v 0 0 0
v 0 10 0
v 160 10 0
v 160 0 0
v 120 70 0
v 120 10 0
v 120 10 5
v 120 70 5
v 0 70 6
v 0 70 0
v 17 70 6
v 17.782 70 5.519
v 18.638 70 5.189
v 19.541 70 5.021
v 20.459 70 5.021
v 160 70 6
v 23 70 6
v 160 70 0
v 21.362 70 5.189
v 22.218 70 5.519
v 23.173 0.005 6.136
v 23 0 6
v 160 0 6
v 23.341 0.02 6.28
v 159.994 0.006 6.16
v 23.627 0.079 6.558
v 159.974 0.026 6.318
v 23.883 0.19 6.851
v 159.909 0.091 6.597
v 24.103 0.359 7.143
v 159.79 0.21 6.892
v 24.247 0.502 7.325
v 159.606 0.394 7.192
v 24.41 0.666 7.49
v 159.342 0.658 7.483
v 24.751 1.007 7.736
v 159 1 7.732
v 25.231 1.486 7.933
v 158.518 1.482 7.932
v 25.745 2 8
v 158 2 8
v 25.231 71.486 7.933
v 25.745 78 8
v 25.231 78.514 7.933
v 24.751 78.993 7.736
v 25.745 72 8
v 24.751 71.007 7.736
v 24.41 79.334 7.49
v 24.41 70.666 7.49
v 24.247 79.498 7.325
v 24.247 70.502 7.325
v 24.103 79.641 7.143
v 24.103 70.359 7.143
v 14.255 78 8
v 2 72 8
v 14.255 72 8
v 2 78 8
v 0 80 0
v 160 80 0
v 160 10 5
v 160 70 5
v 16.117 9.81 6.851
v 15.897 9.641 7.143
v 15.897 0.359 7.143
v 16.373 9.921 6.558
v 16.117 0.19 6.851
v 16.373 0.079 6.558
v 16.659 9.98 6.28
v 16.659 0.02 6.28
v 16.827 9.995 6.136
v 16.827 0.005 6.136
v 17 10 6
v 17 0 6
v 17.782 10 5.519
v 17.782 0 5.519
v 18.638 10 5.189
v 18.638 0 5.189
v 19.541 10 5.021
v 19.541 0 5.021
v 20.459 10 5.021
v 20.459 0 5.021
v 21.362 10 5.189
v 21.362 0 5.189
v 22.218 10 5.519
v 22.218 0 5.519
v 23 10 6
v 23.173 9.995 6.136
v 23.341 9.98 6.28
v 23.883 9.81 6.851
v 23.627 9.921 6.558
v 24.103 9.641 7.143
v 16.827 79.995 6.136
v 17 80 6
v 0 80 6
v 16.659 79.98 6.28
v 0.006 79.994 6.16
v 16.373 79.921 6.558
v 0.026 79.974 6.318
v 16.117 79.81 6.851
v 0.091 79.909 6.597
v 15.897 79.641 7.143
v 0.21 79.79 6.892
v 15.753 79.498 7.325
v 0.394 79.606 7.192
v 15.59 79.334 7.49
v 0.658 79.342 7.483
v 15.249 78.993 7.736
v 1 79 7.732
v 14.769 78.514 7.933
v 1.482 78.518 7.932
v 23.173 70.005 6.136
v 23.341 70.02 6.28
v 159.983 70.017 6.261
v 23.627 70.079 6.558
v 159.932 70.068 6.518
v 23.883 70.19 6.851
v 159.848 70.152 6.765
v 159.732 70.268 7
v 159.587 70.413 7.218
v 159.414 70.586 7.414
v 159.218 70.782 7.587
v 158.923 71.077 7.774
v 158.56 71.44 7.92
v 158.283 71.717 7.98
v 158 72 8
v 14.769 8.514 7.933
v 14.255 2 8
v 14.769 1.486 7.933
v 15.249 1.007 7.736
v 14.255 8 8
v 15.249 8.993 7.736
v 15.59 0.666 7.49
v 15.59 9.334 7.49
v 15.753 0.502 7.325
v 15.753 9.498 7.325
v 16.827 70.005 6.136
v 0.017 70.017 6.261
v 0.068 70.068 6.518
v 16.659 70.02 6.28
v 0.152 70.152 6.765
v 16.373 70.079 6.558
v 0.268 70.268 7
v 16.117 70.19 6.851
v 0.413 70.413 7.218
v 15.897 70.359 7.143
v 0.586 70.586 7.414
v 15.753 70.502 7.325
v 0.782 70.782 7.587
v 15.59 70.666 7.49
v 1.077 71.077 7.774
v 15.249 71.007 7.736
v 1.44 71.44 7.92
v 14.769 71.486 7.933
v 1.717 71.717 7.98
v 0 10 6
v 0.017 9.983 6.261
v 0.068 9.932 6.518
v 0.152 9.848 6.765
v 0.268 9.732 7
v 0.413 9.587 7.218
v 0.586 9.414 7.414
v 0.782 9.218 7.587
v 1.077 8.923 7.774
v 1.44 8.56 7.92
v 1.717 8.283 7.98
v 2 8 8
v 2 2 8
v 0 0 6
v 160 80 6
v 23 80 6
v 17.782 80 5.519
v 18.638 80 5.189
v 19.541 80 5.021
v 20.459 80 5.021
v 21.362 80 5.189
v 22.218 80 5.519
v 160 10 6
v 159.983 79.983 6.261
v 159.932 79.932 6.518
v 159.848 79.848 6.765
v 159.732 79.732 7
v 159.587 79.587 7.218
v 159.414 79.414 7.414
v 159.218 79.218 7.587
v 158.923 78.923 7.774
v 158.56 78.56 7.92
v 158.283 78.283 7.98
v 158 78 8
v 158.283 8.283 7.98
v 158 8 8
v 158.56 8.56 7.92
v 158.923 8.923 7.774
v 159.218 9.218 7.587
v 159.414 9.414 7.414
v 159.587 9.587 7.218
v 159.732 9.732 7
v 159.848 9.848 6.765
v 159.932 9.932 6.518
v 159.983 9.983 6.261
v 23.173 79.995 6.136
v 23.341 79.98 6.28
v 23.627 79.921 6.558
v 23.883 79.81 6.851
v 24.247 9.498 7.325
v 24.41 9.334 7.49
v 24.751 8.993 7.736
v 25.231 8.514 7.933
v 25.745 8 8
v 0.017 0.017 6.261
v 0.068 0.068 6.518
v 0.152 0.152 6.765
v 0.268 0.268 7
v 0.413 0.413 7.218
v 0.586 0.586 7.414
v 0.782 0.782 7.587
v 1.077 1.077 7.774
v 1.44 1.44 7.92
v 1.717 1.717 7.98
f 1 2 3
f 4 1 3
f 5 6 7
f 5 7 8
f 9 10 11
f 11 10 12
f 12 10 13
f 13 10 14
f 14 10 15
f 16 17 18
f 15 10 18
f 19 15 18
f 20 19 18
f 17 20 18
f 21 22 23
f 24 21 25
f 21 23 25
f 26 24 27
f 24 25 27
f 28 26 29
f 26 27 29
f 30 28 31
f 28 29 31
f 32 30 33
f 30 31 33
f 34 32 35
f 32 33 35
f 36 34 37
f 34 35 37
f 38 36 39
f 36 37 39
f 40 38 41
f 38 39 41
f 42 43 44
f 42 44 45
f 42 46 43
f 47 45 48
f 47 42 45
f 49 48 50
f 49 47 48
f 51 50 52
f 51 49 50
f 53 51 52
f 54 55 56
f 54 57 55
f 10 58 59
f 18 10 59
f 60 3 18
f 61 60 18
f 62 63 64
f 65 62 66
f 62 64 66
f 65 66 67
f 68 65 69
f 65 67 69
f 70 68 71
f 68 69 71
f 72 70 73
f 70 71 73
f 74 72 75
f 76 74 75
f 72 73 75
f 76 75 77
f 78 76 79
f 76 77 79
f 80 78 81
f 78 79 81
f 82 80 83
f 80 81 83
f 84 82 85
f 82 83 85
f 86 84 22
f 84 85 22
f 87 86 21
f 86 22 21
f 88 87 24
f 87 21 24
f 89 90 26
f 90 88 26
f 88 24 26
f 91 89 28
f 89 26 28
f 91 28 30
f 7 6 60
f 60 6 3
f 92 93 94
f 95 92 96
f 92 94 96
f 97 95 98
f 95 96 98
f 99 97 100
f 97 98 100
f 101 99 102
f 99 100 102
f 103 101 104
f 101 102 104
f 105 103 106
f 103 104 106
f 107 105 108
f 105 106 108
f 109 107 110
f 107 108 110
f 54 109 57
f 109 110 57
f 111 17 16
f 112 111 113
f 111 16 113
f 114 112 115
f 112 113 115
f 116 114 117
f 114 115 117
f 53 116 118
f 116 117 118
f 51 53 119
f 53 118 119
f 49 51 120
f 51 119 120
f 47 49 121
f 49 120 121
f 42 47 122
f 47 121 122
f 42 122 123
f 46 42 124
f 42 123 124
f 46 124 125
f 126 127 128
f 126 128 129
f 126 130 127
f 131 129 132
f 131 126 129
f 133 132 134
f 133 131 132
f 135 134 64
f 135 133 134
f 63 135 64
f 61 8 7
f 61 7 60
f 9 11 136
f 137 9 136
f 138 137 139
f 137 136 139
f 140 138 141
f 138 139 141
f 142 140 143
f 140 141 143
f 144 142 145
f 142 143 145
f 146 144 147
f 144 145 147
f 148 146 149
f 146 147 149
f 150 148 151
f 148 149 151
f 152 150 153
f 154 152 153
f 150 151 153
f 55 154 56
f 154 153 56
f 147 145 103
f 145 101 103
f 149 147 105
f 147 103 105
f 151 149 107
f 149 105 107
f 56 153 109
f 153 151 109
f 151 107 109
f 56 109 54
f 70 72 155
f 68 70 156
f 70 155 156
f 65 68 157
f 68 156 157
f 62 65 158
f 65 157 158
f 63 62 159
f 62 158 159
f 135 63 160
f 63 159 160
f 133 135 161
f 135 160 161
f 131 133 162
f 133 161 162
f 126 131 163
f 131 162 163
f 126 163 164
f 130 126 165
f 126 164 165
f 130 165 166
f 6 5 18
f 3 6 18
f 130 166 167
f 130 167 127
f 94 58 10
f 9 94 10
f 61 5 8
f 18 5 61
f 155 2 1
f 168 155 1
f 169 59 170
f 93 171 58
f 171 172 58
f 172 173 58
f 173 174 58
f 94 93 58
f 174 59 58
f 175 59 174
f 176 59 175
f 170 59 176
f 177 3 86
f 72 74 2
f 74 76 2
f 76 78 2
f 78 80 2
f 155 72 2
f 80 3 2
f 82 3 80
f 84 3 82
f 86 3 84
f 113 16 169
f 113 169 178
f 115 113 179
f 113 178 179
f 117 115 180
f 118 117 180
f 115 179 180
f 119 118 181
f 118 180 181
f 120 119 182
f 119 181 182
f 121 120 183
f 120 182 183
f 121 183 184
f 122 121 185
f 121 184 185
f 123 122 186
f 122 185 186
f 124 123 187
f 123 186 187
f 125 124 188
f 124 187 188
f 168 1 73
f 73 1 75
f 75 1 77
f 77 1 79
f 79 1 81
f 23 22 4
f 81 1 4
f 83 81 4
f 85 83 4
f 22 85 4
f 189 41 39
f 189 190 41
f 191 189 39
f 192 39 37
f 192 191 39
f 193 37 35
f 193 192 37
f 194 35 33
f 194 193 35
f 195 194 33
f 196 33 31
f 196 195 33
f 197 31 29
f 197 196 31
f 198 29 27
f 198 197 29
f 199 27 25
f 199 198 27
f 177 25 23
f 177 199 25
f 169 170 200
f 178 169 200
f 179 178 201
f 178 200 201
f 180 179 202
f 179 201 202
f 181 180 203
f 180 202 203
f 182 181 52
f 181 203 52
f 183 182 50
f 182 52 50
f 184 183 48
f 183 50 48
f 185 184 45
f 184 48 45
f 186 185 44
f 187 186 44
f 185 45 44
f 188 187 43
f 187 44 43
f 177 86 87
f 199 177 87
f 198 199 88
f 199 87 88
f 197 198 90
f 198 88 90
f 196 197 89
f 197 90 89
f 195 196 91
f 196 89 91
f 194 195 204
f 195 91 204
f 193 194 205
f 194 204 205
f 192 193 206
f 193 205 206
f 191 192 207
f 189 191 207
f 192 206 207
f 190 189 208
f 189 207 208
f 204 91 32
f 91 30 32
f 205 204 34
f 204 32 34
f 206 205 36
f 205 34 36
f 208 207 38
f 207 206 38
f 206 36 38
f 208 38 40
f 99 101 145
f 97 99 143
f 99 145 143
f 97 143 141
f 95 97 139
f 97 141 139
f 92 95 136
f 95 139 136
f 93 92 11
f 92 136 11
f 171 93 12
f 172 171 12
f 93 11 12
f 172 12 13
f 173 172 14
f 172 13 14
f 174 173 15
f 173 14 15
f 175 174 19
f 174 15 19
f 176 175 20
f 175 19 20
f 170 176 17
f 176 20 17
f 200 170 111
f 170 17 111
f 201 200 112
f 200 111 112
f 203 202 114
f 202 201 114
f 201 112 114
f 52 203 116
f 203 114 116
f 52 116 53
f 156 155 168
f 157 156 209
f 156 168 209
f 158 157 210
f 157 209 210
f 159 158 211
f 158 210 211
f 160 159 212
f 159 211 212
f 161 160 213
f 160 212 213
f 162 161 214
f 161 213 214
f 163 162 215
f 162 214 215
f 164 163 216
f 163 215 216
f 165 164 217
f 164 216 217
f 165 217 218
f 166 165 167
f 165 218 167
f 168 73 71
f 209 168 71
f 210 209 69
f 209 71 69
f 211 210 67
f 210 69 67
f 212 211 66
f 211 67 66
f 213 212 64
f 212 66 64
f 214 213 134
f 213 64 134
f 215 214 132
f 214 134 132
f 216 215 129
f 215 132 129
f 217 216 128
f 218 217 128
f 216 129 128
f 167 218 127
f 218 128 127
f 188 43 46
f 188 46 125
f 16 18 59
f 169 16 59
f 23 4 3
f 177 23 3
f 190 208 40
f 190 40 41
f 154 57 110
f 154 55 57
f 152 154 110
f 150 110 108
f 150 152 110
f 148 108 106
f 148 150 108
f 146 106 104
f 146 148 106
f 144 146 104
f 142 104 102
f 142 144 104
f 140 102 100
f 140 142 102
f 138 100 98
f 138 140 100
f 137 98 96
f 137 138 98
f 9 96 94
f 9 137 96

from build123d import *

# Parameters (mm, degrees)
F1_DEPTH = 8
F2_W     = 40
F2_H     = 60
F3_DEPTH = 5
F5_DEPTH = 500
F7_DEPTH = 25
F8_R     = 2
F8_2_R   = 2


with BuildPart() as f1:
    # F0 (on Top) → F1 (new body)
    with BuildSketch(Plane.XY):
        Polygon((0, 10), (0, 0), (160, 0), (160, 10), (140, 10), align=None)
    extrude(amount=F1_DEPTH)


with BuildPart() as f1b:
    # F0 (on Top) → F1, piece 2 (new body)
    with BuildSketch(Plane.XY):
        Polygon((140, 70), (160, 70), (160, 80), (0, 80), (0, 70), align=None)
    extrude(amount=F1_DEPTH)


with BuildPart() as f3:
    # F2 (on Top) → F3 (new body)
    with BuildSketch(Plane.XY):
        with Locations((140, 40)):
            Rectangle(F2_W, F2_H)
    extrude(amount=F3_DEPTH)


with BuildPart() as f5_tool:
    # F4 (on face) → F5 (new body)
    with BuildSketch(Plane.XZ):
        with BuildLine():
            ThreePointArc((15.417424305, 8), (21.0215482184, 5.1054684353), (25, 10))
            ThreePointArc((25, 10), (18.9784517816, 14.8945315647), (15.417424305, 8))
        make_face()
    extrude(amount=-F5_DEPTH)


with BuildPart() as f1_1:
    add(f1.part)

    # F5: cut by f5_tool
    add(f5_tool.part, mode=Mode.SUBTRACT)

    # F6 (on face) → F7 (cut)
    with BuildSketch(Plane(origin=(0, 80, 0), x_dir=(-1, 0, 0), z_dir=(0, 1, 0))):
        with BuildLine():
            ThreePointArc((-15.417424305, 8), (-15.1054684353, 8.9784517816), (-15, 10))
            ThreePointArc((-15, 10), (-24.8945315647, 11.0215482184), (-15.417424305, 8))
        make_face()
    extrude(amount=-F7_DEPTH, mode=Mode.SUBTRACT)

    # F8#2
    f8_2_edges = [f1_1.edges().sort_by_distance(p)[0] for p in [
        (92.291288, 10, 8),
        (160, 5, 8),
        (92.291288, 0, 8),
        (24.582576, 5, 8),
        (7.708712, 10, 8),
        (15.417424, 5, 8),
        (7.708712, 0, 8),
        (0, 5, 8),
    ]]
    fillet(f8_2_edges, radius=F8_2_R)


with BuildPart() as f1b_1:
    add(f1b.part)

    # F5: cut by f5_tool
    add(f5_tool.part, mode=Mode.SUBTRACT)

    # F8
    f8_edges = [f1b_1.edges().sort_by_distance(p)[0] for p in [
        (24.582576, 75, 8),
        (92.291288, 80, 8),
        (160, 75, 8),
        (92.291288, 70, 8),
        (7.708712, 70, 8),
        (0, 75, 8),
        (7.708712, 80, 8),
        (15.417424, 75, 8),
    ]]
    fillet(f8_edges, radius=F8_R)


solid = Compound([f3.part, f1_1.part, f1b_1.part])
